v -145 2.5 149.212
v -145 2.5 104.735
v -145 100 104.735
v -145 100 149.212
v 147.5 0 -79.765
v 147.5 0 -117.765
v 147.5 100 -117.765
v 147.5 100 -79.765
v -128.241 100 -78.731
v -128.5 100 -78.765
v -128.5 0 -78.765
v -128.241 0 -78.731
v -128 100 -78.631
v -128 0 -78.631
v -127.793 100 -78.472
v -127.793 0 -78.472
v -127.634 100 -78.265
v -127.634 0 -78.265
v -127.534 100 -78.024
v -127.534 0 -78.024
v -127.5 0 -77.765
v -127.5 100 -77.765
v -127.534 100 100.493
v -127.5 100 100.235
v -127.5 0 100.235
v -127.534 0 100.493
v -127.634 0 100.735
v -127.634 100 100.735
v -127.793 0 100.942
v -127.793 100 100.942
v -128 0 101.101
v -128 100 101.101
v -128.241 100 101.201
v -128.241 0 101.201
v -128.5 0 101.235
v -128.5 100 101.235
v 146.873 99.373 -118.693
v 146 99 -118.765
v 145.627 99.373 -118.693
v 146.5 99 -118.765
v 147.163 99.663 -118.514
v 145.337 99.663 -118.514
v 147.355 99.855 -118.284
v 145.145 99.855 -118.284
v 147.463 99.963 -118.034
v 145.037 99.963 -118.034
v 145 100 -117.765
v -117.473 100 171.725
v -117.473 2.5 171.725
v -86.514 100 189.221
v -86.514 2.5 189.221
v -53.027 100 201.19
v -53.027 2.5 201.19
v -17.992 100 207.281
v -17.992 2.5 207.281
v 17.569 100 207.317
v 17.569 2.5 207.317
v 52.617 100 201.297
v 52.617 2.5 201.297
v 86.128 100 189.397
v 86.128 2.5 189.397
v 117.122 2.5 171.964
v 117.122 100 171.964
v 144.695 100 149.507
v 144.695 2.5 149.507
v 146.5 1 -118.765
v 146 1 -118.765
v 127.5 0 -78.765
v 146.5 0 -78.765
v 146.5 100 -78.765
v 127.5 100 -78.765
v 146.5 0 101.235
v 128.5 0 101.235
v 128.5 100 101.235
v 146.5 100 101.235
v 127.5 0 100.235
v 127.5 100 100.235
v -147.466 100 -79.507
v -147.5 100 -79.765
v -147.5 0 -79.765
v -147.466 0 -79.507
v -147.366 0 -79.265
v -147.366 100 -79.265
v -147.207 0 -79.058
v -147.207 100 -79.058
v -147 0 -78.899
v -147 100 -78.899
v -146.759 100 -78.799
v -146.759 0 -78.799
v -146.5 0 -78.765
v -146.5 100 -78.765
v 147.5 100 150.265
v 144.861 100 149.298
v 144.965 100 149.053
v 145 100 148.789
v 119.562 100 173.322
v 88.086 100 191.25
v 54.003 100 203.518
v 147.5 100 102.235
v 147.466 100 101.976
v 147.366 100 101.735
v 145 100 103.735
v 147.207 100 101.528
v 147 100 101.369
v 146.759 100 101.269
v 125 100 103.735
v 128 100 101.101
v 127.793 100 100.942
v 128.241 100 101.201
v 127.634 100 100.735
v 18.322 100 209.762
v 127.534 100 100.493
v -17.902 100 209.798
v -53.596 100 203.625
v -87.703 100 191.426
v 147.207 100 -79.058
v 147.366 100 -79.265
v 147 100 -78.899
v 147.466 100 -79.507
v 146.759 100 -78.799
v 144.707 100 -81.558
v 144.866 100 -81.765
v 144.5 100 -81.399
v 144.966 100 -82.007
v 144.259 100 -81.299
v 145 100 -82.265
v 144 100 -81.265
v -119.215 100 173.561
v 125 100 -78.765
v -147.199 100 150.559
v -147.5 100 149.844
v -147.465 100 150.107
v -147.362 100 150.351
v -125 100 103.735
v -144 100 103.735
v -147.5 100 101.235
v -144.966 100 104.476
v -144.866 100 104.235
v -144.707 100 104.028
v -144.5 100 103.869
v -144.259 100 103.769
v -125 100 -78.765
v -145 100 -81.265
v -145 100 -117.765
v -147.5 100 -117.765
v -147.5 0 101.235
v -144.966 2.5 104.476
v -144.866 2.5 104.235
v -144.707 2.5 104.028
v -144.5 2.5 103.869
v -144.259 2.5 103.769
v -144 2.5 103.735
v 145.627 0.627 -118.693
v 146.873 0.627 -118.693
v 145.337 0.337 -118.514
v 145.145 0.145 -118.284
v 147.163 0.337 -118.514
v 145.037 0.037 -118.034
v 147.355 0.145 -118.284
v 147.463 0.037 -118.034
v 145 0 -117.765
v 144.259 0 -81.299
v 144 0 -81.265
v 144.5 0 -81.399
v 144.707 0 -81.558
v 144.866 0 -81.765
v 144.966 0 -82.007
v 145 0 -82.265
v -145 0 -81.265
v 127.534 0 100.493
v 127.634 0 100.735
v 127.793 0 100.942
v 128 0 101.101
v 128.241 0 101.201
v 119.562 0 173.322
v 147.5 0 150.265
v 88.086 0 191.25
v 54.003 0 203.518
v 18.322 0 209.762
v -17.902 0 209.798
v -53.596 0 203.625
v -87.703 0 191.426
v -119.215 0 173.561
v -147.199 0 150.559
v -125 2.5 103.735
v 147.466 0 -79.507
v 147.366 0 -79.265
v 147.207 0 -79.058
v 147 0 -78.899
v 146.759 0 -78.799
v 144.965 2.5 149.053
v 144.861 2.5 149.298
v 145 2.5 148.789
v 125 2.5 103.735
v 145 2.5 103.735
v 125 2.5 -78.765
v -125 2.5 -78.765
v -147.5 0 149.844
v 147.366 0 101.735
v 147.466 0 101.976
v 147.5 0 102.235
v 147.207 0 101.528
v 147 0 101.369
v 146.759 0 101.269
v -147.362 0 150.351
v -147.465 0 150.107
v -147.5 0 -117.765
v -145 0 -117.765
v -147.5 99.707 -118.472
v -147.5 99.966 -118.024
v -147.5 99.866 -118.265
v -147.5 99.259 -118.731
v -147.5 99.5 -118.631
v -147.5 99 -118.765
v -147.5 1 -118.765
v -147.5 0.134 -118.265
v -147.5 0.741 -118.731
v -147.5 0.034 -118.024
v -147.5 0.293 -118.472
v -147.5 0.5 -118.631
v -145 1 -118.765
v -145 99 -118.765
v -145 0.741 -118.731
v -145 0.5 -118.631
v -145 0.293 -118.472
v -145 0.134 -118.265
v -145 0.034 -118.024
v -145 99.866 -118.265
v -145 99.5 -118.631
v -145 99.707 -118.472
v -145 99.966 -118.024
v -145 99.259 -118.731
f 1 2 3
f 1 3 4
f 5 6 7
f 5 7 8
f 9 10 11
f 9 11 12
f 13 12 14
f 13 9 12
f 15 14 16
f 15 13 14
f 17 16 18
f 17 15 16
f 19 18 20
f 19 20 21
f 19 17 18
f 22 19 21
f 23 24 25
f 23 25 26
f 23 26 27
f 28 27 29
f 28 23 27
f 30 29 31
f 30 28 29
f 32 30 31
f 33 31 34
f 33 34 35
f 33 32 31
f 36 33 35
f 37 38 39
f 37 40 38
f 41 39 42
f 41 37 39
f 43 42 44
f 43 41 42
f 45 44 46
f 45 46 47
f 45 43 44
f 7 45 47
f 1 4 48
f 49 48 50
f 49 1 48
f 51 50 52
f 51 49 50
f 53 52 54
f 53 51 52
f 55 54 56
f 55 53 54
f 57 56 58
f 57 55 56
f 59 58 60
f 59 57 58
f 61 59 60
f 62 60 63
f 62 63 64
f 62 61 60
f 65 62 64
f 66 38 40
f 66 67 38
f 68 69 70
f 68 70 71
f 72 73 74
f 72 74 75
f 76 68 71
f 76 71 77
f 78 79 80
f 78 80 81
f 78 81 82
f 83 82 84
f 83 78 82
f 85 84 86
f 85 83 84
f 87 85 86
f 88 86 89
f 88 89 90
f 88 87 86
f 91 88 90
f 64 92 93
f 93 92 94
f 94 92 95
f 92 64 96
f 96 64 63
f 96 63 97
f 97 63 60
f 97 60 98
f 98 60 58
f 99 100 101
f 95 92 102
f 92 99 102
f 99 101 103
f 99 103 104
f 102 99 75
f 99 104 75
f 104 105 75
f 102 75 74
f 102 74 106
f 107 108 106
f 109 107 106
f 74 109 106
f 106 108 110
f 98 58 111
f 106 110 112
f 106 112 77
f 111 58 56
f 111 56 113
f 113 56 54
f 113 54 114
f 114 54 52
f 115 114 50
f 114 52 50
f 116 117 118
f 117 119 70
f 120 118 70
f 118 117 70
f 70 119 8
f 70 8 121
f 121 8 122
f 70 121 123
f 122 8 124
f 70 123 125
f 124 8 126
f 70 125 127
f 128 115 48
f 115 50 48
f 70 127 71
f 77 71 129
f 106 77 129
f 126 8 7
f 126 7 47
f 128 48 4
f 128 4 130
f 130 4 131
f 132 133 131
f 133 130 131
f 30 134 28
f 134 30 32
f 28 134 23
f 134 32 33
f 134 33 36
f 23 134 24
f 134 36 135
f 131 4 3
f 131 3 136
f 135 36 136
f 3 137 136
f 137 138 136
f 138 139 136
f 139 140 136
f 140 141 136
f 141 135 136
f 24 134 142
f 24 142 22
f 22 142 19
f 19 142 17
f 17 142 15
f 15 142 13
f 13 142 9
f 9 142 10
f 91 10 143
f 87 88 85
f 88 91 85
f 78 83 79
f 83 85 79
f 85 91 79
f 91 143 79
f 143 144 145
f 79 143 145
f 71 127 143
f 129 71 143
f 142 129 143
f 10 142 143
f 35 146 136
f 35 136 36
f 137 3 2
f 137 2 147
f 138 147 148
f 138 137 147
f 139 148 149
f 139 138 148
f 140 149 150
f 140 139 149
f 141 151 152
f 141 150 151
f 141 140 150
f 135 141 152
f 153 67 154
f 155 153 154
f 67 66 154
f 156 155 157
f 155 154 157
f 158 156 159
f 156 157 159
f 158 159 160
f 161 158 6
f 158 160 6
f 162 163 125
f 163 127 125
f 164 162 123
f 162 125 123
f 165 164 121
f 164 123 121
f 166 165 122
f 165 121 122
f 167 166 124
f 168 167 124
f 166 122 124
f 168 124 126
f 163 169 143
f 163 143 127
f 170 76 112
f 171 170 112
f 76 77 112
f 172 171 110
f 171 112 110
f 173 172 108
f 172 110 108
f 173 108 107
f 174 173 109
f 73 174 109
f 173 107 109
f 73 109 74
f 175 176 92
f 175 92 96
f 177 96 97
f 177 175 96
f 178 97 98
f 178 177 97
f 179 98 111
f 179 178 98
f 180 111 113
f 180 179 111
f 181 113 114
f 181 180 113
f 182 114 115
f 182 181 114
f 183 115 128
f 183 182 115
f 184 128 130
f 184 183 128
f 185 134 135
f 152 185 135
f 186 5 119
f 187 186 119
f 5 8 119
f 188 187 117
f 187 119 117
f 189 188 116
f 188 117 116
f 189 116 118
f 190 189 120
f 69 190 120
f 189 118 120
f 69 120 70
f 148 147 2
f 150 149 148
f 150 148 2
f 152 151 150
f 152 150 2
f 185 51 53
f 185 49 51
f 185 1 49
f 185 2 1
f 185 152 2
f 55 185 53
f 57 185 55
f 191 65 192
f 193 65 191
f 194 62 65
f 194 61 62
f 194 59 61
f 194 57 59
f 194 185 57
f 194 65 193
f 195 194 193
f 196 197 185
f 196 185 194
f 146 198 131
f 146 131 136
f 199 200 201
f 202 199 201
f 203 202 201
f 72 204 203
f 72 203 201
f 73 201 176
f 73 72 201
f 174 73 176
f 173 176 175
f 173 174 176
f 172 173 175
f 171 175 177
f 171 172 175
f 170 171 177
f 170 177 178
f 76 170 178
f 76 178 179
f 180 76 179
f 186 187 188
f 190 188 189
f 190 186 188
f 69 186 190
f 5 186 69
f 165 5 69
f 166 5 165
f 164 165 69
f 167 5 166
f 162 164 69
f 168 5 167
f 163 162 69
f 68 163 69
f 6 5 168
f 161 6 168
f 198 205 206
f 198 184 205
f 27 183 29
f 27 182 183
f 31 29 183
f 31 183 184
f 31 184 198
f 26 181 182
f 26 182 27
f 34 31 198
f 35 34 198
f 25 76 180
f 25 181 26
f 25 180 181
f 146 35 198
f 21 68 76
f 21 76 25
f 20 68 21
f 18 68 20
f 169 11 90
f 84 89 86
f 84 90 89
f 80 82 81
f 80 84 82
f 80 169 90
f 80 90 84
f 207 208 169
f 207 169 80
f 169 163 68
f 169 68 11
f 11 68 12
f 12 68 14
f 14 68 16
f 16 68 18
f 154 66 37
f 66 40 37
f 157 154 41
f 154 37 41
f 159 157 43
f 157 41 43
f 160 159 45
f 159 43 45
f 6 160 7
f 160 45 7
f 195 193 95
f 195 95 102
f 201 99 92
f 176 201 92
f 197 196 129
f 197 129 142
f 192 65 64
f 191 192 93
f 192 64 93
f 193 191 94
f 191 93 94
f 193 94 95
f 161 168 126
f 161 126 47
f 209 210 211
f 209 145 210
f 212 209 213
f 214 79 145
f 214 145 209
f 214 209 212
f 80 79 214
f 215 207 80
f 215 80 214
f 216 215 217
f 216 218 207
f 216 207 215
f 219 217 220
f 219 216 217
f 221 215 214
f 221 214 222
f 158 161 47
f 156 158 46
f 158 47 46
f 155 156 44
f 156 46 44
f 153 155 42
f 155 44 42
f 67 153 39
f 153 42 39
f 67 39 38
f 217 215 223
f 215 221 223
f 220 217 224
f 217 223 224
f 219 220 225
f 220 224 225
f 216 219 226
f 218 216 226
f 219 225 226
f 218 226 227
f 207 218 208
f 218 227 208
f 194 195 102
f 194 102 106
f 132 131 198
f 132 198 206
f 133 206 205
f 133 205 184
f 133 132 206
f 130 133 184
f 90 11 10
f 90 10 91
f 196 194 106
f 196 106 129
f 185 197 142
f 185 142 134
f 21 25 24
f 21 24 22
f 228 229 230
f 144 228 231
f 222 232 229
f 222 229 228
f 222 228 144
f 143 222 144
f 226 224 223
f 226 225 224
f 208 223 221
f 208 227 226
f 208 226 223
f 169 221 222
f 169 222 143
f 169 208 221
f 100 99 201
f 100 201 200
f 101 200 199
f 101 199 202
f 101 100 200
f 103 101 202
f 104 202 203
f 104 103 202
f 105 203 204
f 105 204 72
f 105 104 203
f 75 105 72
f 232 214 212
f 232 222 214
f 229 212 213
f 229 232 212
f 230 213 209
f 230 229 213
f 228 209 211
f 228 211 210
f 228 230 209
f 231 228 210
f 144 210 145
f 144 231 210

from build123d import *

# Parameters (mm, degrees)
BOSS_EXTRUDE1_DEPTH = 100
FILLET1_R           = 1
BOSS_EXTRUDE2_START = 2.5
BOSS_EXTRUDE2_DEPTH = 2.5


with BuildPart() as part:
    # Sketch1 → Boss-Extrude1 (new body)
    with BuildSketch(Plane(origin=(0, 0, 0), x_dir=(1, 0, 0), z_dir=(0, 1, 0))):
        with BuildLine():
            Line((-147.5, 118.765325103), (-145, 118.765325103))
            Line((-145, 118.765325103), (-145, 81.265325103))
            Line((-145, 81.265325103), (-125, 81.265325103))
            Line((-125, 81.265325103), (125, 81.265325103))
            Line((125, 81.265325103), (145, 81.265325103))
            Line((145, 81.265325103), (145, 118.765325103))
            Line((145, 118.765325103), (147.5, 118.765325103))
            Line((147.5, 118.765325103), (147.5, 78.765325103))
            Line((147.5, 78.765325103), (127.5, 78.765325103))
            Line((127.5, 78.765325103), (127.5, -101.234674897))
            Line((127.5, -101.234674897), (147.5, -101.234674897))
            Line((147.5, -101.234674897), (147.5, -150.264700033))
            ThreePointArc((147.5, -150.264700033), (0, -210.560514048), (-147.5, -150.264700033))
            Line((-147.5, -150.264700033), (-147.5, -101.234674897))
            Line((-147.5, -101.234674897), (-127.5, -101.234674897))
            Line((-127.5, -101.234674897), (-127.5, 78.765325103))
            Line((-127.5, 78.765325103), (-147.5, 78.765325103))
            Line((-147.5, 78.765325103), (-147.5, 118.765325103))
        make_face()
        with BuildLine():
            Line((145, -149.211854441), (145, -103.734674897))
            Line((145, -103.734674897), (125, -103.734674897))
            Line((125, -103.734674897), (125, 78.765325103))
            Line((125, 78.765325103), (-125, 78.765325103))
            Line((-125, 78.765325103), (-125, -103.734674897))
            Line((-125, -103.734674897), (-145, -103.734674897))
            Line((-145, -103.734674897), (-145, -149.211854441))
            ThreePointArc((-145, -149.211854441), (0, -208.060514048), (145, -149.211854441))
        make_face(mode=Mode.SUBTRACT)
    extrude(amount=BOSS_EXTRUDE1_DEPTH)

    # Fillet1
    fillet1_edges = [part.edges().sort_by_distance(p)[0] for p in [
        (-146.25, 0, -118.765325103),
        (146.25, 100, -118.765325103),
        (146.25, 0, -118.765325103),
        (147.5, 50, 101.234674897),
        (-147.5, 50, 150.264700033),
        (-127.5, 50, 101.234674897),
        (-127.5, 50, -78.765325103),
        (-147.5, 50, -78.765325103),
        (145, 50, -81.265325103),
        (145, 50, -118.765325103),
        (147.5, 50, -118.765325103),
        (147.5, 50, -78.765325103),
        (127.5, 50, 101.234674897),
        (-146.25, 100, -118.765325103),
        (-145, 50, 103.734674897),
        (145, 50, 149.211854441),
    ]]
    fillet(fillet1_edges, radius=FILLET1_R)

    # Sketch4 → Boss-Extrude2 (add)
    with BuildSketch(Plane(origin=(0, 0, 0), x_dir=(1, 0, 0), z_dir=(0, 1, 0)).offset(BOSS_EXTRUDE2_START)):
        with BuildLine():
            Line((147.5, 79.765325103), (147.5, 117.765325103))
            Line((147.5, 117.765325103), (145, 117.765325103))
            Line((145, 117.765325103), (145, 82.265325103))
            ThreePointArc((145, 82.265325103), (144.707106781, 81.558218322), (144, 81.265325103))
            Line((144, 81.265325103), (-145, 81.265325103))
            Line((-145, 81.265325103), (-145, 117.765325103))
            Line((-145, 117.765325103), (-147.5, 117.765325103))
            Line((-147.5, 117.765325103), (-147.5, 79.765325103))
            ThreePointArc((-147.5, 79.765325103), (-147.207106781, 79.058218322), (-146.5, 78.765325103))
            Line((-146.5, 78.765325103), (-128.5, 78.765325103))
            ThreePointArc((-128.5, 78.765325103), (-127.792893219, 78.472431884), (-127.5, 77.765325103))
            Line((-127.5, 77.765325103), (-127.5, -100.234674897))
            ThreePointArc((-127.5, -100.234674897), (-127.792893219, -100.941781678), (-128.5, -101.234674897))
            Line((-128.5, -101.234674897), (-147.5, -101.234674897))
            Line((-147.5, -101.234674897), (-147.5, -149.844449507))
            ThreePointArc((-147.5, -149.844449507), (-147.421705506, -150.232339904), (-147.19908208, -150.559490936))
            ThreePointArc((-147.19908208, -150.559490936), (0.210626014, -210.560408702), (147.5, -150.264700033))
            Line((147.5, -150.264700033), (147.5, -102.234674897))
            ThreePointArc((147.5, -102.234674897), (147.207106781, -101.527568116), (146.5, -101.234674897))
            Line((146.5, -101.234674897), (128.5, -101.234674897))
            ThreePointArc((128.5, -101.234674897), (127.792893219, -100.941781678), (127.5, -100.234674897))
            Line((127.5, -100.234674897), (127.5, 78.765325103))
            Line((127.5, 78.765325103), (146.5, 78.765325103))
            ThreePointArc((146.5, 78.765325103), (147.207106781, 79.058218322), (147.5, 79.765325103))
        make_face()
    extrude(amount=-BOSS_EXTRUDE2_DEPTH)


solid = part.part
